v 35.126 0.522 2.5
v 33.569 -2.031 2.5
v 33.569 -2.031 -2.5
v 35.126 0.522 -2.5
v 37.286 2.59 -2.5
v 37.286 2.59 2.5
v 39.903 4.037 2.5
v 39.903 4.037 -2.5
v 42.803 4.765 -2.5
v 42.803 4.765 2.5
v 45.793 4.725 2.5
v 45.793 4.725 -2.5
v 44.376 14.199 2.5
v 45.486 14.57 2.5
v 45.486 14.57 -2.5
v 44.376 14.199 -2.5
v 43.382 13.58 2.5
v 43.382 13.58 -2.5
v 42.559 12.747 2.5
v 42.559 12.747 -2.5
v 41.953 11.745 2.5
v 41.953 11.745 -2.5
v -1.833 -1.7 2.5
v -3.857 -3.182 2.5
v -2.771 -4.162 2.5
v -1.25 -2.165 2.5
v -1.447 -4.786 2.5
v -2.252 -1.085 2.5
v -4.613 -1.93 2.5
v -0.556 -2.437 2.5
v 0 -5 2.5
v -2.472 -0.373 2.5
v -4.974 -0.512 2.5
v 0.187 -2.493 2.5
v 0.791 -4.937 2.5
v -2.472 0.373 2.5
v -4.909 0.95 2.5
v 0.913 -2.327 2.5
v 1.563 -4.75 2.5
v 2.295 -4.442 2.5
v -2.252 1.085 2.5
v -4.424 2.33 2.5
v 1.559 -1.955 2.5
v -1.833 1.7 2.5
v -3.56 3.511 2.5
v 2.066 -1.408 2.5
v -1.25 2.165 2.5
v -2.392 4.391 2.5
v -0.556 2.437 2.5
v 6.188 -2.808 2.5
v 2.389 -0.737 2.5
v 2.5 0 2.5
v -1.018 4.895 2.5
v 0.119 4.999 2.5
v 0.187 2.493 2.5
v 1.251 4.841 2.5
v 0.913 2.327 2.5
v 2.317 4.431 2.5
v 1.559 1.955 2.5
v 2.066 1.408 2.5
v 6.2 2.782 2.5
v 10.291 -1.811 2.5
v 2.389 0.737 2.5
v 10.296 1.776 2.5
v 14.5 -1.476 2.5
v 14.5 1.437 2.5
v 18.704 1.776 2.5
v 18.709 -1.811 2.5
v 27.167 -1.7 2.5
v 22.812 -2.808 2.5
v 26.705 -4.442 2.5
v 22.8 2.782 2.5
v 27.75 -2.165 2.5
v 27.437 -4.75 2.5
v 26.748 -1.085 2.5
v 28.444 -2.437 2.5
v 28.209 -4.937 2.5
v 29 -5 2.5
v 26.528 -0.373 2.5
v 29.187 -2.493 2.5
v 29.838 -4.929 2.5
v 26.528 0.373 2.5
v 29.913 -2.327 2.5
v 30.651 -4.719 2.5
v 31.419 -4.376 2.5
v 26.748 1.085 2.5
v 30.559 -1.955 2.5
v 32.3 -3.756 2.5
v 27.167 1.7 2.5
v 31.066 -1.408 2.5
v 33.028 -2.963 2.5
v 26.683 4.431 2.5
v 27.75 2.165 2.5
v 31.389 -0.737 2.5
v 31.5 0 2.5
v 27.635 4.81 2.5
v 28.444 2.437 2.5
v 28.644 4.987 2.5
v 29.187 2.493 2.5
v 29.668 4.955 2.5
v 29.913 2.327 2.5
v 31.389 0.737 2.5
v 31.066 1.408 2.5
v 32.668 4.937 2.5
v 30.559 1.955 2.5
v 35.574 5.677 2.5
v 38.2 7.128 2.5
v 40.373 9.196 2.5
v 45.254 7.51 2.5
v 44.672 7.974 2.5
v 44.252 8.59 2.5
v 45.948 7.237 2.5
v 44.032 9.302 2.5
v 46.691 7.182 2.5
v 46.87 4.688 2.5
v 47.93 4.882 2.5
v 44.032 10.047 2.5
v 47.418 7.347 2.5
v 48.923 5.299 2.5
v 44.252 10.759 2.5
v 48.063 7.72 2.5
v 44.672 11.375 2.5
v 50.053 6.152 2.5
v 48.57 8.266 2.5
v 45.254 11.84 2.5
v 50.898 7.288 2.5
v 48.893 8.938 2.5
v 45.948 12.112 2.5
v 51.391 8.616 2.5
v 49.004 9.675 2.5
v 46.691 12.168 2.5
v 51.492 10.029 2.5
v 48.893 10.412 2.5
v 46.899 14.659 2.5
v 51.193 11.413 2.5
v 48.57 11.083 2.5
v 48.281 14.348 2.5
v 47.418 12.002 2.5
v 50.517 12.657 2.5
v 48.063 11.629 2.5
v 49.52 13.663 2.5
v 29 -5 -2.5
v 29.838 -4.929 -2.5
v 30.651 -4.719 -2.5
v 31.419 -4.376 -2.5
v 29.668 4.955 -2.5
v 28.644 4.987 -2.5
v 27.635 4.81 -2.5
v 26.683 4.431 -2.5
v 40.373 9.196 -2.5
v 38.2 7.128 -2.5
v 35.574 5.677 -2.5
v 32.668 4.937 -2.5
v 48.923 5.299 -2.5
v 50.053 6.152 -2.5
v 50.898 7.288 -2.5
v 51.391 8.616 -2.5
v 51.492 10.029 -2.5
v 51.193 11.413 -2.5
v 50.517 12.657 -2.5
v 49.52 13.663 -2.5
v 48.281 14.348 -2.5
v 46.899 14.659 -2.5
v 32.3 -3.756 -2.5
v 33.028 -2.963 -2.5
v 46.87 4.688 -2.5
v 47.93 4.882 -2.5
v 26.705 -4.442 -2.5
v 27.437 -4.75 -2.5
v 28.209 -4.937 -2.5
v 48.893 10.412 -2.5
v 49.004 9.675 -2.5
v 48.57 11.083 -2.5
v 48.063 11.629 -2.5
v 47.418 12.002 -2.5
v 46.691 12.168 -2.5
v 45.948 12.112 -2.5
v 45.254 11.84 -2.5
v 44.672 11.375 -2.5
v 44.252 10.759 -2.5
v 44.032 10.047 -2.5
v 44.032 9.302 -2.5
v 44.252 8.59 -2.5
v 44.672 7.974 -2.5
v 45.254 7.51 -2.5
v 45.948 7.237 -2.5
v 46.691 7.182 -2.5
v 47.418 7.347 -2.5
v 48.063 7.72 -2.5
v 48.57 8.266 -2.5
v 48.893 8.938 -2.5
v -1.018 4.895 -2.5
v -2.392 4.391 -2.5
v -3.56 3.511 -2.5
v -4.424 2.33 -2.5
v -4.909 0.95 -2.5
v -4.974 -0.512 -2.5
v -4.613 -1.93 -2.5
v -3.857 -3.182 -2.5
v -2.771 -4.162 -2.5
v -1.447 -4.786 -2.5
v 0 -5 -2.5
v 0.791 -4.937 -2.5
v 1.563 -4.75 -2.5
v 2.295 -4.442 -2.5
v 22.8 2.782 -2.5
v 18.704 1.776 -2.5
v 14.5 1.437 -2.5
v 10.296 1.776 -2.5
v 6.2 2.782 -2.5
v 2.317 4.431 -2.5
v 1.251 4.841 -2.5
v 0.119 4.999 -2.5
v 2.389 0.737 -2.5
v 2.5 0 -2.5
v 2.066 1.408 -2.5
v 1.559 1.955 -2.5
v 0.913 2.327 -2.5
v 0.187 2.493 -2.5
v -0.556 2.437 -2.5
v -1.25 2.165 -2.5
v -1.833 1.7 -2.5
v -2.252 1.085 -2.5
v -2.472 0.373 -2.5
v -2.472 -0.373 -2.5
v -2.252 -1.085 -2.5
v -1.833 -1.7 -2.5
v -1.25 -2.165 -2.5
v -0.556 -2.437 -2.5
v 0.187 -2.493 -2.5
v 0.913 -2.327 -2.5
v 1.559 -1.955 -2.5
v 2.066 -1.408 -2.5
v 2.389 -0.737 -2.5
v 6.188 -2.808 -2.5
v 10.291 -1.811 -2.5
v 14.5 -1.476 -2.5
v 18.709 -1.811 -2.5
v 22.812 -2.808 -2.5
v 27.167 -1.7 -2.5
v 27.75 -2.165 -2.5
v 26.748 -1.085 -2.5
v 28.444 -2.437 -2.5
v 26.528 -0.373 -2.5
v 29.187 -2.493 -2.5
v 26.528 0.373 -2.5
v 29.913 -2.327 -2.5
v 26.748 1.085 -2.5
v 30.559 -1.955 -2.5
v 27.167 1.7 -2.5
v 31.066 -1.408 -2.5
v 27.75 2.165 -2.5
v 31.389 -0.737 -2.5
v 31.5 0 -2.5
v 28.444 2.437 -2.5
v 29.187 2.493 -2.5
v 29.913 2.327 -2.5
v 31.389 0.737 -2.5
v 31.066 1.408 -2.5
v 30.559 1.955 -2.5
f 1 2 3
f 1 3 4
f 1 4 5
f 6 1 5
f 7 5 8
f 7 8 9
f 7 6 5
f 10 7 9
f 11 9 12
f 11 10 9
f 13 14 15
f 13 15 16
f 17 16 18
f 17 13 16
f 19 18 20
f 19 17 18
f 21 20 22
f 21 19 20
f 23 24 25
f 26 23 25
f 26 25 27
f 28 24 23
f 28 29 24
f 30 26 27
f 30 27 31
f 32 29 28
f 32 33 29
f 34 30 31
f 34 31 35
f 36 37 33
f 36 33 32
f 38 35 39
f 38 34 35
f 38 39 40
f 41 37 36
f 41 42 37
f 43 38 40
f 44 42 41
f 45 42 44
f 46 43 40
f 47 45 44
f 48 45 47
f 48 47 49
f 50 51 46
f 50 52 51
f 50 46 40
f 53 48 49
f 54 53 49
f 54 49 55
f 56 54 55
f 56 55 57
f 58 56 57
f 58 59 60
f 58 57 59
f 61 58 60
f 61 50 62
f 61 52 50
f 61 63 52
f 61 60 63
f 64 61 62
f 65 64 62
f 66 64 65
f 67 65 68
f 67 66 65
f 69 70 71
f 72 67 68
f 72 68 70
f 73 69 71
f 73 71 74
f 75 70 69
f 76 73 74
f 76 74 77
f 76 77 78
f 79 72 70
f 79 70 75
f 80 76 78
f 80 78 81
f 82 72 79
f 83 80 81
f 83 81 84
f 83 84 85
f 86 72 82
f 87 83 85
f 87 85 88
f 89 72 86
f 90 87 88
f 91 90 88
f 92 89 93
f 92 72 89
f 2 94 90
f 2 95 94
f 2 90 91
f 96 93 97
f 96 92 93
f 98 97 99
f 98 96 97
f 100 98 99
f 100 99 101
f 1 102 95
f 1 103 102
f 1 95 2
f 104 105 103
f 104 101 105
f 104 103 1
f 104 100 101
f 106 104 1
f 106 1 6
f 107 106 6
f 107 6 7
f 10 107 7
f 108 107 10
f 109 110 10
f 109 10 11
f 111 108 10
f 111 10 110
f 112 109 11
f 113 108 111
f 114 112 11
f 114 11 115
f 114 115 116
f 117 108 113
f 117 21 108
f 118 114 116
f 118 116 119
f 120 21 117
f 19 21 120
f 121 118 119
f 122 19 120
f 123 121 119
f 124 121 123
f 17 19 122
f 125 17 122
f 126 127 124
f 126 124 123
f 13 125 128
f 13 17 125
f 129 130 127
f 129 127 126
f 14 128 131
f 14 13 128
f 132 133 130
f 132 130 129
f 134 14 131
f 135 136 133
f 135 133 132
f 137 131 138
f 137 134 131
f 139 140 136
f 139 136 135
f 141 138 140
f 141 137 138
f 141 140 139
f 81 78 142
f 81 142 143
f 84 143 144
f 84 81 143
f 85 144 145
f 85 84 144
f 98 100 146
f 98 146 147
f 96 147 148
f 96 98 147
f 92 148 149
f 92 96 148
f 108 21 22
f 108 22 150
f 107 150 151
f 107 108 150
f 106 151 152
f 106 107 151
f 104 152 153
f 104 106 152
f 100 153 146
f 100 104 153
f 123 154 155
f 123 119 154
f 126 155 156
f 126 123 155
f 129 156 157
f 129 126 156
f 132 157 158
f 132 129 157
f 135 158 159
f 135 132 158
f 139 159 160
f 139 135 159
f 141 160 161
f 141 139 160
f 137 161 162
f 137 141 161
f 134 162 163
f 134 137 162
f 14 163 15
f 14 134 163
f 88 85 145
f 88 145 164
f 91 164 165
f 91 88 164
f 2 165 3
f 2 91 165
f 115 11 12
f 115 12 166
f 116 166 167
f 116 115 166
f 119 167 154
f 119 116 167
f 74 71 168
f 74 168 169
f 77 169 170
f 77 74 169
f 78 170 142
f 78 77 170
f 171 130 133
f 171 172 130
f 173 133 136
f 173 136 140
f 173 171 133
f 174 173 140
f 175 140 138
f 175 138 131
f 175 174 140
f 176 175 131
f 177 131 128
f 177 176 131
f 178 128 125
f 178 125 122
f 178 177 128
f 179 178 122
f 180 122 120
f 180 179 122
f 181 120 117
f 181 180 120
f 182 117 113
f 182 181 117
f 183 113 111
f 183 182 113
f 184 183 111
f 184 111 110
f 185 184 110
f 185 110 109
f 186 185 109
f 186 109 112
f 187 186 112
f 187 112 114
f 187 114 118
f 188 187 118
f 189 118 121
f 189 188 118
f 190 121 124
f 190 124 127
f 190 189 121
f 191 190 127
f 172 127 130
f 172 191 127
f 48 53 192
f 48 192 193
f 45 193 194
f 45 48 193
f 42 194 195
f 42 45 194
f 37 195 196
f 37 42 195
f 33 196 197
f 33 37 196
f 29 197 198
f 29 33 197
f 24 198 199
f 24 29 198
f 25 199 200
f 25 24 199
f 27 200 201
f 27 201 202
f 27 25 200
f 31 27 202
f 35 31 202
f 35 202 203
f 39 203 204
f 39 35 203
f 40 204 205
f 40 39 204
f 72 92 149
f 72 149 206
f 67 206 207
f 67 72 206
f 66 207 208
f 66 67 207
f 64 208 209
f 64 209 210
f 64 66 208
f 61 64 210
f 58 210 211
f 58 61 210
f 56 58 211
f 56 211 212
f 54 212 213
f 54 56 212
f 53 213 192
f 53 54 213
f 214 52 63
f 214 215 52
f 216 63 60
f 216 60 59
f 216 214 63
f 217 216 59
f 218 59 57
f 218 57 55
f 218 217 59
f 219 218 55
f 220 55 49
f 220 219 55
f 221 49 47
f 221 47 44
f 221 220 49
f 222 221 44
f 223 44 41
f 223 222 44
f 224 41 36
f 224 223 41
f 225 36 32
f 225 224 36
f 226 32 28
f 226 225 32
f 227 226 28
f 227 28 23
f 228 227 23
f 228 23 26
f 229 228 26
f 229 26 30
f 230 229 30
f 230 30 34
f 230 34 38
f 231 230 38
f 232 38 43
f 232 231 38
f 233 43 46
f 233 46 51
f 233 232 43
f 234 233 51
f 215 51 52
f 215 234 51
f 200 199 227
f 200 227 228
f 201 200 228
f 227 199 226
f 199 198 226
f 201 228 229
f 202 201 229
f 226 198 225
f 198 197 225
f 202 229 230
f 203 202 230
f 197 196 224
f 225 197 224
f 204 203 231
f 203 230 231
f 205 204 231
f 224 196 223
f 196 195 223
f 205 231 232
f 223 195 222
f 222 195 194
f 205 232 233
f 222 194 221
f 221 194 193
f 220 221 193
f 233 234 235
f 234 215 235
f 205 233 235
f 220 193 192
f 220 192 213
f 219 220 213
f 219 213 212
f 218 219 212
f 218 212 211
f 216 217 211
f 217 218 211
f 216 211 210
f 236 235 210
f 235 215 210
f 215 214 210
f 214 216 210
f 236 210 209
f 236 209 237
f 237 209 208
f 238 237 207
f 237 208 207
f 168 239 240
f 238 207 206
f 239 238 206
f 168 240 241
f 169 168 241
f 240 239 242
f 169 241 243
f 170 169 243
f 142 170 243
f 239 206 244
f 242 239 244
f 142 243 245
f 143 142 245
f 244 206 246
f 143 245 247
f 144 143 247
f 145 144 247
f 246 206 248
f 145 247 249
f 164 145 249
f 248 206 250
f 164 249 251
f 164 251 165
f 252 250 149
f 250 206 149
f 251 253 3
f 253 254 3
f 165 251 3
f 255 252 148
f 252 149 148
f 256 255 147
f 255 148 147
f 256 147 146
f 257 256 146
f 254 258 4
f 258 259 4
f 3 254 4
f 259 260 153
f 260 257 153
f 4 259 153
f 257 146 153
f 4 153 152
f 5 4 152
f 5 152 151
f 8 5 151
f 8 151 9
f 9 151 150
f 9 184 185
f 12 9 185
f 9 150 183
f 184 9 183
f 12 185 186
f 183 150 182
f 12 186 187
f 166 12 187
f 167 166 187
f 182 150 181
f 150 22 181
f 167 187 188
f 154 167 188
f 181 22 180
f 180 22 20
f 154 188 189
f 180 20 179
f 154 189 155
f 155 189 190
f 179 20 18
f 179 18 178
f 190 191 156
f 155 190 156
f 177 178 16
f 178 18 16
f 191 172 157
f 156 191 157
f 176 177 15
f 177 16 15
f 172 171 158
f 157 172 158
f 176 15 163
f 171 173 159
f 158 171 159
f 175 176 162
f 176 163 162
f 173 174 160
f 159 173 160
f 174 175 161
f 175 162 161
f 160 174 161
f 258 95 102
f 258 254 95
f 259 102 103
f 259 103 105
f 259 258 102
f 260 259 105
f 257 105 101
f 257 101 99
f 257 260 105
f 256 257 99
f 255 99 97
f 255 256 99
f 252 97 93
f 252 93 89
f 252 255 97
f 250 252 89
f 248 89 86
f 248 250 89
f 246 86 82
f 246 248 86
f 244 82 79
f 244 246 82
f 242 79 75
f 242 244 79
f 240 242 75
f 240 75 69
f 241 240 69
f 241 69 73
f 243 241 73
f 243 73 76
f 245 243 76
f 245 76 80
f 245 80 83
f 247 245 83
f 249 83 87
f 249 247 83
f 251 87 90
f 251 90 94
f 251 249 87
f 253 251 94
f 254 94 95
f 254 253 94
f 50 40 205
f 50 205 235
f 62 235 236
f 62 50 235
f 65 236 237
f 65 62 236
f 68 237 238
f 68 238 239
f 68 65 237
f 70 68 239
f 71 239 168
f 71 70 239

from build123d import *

# Parameters (mm, degrees)
SKETCH_1_R          = 2.5
EXTRUDE_1_DEPTH     = 2.5
SKETCH_2_OUTSIDE_W  = 70.512
SKETCH_2_OUTSIDE_H  = 33.683
CUT_EXTRUDE_1_DEPTH = 5


with BuildPart() as part:
    # 草圖1 → 填料-伸長1 (new body, symmetric)
    with BuildSketch(Plane.XY):
        with BuildLine():
            Line((45.485924683, 14.569854348), (-1.018385662, 4.895190563))
            ThreePointArc((-1.018385662, 4.895190563), (-4.973728622, -0.511882402), (0, -5))
            Line((0, -5), (29, -5))
            ThreePointArc((29, -5), (30.248921949, -4.841507406), (31.418665946, -4.376077586))
            Line((31.418665946, -4.376077586), (48.922976291, 5.298586199))
            ThreePointArc((48.922976291, 5.298586199), (51.192518904, 11.412680042), (45.485924683, 14.569854348))
        make_face()
        with Locations((46.504310345, 9.674663785)):
            Circle(SKETCH_1_R, mode=Mode.SUBTRACT)
        with Locations((29, 0)):
            Circle(SKETCH_1_R, mode=Mode.SUBTRACT)
        Circle(SKETCH_1_R, mode=Mode.SUBTRACT)
    extrude(amount=EXTRUDE_1_DEPTH, both=True)

    # 草圖2 outside → 除料-伸長1 (cut)
    with BuildSketch(Plane.XY.offset(2.5)):
        with Locations((23.252, 4.8375)):
            Rectangle(SKETCH_2_OUTSIDE_W, SKETCH_2_OUTSIDE_H)
        with BuildLine():
            ThreePointArc((45.79340971, 4.725459779), (50.890857954, 12.074288771), (41.953237231, 11.745348096))
            ThreePointArc((41.953237231, 11.745348096), (36.933542301, 6.318443182), (29.667856416, 4.955196041))
            ThreePointArc((29.667856416, 4.955196041), (28.134691665, 4.924554953), (26.682918959, 4.43070372))
            ThreePointArc((26.682918959, 4.43070372), (14.5, 1.437415904), (2.317081041, 4.43070372))
            ThreePointArc((2.317081041, 4.43070372), (-4.999984203, 0.012568795), (2.294776385, -4.442296855))
            ThreePointArc((2.294776385, -4.442296855), (14.5, -1.476041996), (26.705223615, -4.442296855))
            ThreePointArc((26.705223615, -4.442296855), (30.657237876, -4.717368188), (33.568899121, -2.031049192))
            ThreePointArc((33.568899121, -2.031049192), (38.547411457, 3.398479533), (45.79340971, 4.725459779))
        make_face(mode=Mode.SUBTRACT)
    extrude(amount=-CUT_EXTRUDE_1_DEPTH, mode=Mode.SUBTRACT)


solid = part.part
